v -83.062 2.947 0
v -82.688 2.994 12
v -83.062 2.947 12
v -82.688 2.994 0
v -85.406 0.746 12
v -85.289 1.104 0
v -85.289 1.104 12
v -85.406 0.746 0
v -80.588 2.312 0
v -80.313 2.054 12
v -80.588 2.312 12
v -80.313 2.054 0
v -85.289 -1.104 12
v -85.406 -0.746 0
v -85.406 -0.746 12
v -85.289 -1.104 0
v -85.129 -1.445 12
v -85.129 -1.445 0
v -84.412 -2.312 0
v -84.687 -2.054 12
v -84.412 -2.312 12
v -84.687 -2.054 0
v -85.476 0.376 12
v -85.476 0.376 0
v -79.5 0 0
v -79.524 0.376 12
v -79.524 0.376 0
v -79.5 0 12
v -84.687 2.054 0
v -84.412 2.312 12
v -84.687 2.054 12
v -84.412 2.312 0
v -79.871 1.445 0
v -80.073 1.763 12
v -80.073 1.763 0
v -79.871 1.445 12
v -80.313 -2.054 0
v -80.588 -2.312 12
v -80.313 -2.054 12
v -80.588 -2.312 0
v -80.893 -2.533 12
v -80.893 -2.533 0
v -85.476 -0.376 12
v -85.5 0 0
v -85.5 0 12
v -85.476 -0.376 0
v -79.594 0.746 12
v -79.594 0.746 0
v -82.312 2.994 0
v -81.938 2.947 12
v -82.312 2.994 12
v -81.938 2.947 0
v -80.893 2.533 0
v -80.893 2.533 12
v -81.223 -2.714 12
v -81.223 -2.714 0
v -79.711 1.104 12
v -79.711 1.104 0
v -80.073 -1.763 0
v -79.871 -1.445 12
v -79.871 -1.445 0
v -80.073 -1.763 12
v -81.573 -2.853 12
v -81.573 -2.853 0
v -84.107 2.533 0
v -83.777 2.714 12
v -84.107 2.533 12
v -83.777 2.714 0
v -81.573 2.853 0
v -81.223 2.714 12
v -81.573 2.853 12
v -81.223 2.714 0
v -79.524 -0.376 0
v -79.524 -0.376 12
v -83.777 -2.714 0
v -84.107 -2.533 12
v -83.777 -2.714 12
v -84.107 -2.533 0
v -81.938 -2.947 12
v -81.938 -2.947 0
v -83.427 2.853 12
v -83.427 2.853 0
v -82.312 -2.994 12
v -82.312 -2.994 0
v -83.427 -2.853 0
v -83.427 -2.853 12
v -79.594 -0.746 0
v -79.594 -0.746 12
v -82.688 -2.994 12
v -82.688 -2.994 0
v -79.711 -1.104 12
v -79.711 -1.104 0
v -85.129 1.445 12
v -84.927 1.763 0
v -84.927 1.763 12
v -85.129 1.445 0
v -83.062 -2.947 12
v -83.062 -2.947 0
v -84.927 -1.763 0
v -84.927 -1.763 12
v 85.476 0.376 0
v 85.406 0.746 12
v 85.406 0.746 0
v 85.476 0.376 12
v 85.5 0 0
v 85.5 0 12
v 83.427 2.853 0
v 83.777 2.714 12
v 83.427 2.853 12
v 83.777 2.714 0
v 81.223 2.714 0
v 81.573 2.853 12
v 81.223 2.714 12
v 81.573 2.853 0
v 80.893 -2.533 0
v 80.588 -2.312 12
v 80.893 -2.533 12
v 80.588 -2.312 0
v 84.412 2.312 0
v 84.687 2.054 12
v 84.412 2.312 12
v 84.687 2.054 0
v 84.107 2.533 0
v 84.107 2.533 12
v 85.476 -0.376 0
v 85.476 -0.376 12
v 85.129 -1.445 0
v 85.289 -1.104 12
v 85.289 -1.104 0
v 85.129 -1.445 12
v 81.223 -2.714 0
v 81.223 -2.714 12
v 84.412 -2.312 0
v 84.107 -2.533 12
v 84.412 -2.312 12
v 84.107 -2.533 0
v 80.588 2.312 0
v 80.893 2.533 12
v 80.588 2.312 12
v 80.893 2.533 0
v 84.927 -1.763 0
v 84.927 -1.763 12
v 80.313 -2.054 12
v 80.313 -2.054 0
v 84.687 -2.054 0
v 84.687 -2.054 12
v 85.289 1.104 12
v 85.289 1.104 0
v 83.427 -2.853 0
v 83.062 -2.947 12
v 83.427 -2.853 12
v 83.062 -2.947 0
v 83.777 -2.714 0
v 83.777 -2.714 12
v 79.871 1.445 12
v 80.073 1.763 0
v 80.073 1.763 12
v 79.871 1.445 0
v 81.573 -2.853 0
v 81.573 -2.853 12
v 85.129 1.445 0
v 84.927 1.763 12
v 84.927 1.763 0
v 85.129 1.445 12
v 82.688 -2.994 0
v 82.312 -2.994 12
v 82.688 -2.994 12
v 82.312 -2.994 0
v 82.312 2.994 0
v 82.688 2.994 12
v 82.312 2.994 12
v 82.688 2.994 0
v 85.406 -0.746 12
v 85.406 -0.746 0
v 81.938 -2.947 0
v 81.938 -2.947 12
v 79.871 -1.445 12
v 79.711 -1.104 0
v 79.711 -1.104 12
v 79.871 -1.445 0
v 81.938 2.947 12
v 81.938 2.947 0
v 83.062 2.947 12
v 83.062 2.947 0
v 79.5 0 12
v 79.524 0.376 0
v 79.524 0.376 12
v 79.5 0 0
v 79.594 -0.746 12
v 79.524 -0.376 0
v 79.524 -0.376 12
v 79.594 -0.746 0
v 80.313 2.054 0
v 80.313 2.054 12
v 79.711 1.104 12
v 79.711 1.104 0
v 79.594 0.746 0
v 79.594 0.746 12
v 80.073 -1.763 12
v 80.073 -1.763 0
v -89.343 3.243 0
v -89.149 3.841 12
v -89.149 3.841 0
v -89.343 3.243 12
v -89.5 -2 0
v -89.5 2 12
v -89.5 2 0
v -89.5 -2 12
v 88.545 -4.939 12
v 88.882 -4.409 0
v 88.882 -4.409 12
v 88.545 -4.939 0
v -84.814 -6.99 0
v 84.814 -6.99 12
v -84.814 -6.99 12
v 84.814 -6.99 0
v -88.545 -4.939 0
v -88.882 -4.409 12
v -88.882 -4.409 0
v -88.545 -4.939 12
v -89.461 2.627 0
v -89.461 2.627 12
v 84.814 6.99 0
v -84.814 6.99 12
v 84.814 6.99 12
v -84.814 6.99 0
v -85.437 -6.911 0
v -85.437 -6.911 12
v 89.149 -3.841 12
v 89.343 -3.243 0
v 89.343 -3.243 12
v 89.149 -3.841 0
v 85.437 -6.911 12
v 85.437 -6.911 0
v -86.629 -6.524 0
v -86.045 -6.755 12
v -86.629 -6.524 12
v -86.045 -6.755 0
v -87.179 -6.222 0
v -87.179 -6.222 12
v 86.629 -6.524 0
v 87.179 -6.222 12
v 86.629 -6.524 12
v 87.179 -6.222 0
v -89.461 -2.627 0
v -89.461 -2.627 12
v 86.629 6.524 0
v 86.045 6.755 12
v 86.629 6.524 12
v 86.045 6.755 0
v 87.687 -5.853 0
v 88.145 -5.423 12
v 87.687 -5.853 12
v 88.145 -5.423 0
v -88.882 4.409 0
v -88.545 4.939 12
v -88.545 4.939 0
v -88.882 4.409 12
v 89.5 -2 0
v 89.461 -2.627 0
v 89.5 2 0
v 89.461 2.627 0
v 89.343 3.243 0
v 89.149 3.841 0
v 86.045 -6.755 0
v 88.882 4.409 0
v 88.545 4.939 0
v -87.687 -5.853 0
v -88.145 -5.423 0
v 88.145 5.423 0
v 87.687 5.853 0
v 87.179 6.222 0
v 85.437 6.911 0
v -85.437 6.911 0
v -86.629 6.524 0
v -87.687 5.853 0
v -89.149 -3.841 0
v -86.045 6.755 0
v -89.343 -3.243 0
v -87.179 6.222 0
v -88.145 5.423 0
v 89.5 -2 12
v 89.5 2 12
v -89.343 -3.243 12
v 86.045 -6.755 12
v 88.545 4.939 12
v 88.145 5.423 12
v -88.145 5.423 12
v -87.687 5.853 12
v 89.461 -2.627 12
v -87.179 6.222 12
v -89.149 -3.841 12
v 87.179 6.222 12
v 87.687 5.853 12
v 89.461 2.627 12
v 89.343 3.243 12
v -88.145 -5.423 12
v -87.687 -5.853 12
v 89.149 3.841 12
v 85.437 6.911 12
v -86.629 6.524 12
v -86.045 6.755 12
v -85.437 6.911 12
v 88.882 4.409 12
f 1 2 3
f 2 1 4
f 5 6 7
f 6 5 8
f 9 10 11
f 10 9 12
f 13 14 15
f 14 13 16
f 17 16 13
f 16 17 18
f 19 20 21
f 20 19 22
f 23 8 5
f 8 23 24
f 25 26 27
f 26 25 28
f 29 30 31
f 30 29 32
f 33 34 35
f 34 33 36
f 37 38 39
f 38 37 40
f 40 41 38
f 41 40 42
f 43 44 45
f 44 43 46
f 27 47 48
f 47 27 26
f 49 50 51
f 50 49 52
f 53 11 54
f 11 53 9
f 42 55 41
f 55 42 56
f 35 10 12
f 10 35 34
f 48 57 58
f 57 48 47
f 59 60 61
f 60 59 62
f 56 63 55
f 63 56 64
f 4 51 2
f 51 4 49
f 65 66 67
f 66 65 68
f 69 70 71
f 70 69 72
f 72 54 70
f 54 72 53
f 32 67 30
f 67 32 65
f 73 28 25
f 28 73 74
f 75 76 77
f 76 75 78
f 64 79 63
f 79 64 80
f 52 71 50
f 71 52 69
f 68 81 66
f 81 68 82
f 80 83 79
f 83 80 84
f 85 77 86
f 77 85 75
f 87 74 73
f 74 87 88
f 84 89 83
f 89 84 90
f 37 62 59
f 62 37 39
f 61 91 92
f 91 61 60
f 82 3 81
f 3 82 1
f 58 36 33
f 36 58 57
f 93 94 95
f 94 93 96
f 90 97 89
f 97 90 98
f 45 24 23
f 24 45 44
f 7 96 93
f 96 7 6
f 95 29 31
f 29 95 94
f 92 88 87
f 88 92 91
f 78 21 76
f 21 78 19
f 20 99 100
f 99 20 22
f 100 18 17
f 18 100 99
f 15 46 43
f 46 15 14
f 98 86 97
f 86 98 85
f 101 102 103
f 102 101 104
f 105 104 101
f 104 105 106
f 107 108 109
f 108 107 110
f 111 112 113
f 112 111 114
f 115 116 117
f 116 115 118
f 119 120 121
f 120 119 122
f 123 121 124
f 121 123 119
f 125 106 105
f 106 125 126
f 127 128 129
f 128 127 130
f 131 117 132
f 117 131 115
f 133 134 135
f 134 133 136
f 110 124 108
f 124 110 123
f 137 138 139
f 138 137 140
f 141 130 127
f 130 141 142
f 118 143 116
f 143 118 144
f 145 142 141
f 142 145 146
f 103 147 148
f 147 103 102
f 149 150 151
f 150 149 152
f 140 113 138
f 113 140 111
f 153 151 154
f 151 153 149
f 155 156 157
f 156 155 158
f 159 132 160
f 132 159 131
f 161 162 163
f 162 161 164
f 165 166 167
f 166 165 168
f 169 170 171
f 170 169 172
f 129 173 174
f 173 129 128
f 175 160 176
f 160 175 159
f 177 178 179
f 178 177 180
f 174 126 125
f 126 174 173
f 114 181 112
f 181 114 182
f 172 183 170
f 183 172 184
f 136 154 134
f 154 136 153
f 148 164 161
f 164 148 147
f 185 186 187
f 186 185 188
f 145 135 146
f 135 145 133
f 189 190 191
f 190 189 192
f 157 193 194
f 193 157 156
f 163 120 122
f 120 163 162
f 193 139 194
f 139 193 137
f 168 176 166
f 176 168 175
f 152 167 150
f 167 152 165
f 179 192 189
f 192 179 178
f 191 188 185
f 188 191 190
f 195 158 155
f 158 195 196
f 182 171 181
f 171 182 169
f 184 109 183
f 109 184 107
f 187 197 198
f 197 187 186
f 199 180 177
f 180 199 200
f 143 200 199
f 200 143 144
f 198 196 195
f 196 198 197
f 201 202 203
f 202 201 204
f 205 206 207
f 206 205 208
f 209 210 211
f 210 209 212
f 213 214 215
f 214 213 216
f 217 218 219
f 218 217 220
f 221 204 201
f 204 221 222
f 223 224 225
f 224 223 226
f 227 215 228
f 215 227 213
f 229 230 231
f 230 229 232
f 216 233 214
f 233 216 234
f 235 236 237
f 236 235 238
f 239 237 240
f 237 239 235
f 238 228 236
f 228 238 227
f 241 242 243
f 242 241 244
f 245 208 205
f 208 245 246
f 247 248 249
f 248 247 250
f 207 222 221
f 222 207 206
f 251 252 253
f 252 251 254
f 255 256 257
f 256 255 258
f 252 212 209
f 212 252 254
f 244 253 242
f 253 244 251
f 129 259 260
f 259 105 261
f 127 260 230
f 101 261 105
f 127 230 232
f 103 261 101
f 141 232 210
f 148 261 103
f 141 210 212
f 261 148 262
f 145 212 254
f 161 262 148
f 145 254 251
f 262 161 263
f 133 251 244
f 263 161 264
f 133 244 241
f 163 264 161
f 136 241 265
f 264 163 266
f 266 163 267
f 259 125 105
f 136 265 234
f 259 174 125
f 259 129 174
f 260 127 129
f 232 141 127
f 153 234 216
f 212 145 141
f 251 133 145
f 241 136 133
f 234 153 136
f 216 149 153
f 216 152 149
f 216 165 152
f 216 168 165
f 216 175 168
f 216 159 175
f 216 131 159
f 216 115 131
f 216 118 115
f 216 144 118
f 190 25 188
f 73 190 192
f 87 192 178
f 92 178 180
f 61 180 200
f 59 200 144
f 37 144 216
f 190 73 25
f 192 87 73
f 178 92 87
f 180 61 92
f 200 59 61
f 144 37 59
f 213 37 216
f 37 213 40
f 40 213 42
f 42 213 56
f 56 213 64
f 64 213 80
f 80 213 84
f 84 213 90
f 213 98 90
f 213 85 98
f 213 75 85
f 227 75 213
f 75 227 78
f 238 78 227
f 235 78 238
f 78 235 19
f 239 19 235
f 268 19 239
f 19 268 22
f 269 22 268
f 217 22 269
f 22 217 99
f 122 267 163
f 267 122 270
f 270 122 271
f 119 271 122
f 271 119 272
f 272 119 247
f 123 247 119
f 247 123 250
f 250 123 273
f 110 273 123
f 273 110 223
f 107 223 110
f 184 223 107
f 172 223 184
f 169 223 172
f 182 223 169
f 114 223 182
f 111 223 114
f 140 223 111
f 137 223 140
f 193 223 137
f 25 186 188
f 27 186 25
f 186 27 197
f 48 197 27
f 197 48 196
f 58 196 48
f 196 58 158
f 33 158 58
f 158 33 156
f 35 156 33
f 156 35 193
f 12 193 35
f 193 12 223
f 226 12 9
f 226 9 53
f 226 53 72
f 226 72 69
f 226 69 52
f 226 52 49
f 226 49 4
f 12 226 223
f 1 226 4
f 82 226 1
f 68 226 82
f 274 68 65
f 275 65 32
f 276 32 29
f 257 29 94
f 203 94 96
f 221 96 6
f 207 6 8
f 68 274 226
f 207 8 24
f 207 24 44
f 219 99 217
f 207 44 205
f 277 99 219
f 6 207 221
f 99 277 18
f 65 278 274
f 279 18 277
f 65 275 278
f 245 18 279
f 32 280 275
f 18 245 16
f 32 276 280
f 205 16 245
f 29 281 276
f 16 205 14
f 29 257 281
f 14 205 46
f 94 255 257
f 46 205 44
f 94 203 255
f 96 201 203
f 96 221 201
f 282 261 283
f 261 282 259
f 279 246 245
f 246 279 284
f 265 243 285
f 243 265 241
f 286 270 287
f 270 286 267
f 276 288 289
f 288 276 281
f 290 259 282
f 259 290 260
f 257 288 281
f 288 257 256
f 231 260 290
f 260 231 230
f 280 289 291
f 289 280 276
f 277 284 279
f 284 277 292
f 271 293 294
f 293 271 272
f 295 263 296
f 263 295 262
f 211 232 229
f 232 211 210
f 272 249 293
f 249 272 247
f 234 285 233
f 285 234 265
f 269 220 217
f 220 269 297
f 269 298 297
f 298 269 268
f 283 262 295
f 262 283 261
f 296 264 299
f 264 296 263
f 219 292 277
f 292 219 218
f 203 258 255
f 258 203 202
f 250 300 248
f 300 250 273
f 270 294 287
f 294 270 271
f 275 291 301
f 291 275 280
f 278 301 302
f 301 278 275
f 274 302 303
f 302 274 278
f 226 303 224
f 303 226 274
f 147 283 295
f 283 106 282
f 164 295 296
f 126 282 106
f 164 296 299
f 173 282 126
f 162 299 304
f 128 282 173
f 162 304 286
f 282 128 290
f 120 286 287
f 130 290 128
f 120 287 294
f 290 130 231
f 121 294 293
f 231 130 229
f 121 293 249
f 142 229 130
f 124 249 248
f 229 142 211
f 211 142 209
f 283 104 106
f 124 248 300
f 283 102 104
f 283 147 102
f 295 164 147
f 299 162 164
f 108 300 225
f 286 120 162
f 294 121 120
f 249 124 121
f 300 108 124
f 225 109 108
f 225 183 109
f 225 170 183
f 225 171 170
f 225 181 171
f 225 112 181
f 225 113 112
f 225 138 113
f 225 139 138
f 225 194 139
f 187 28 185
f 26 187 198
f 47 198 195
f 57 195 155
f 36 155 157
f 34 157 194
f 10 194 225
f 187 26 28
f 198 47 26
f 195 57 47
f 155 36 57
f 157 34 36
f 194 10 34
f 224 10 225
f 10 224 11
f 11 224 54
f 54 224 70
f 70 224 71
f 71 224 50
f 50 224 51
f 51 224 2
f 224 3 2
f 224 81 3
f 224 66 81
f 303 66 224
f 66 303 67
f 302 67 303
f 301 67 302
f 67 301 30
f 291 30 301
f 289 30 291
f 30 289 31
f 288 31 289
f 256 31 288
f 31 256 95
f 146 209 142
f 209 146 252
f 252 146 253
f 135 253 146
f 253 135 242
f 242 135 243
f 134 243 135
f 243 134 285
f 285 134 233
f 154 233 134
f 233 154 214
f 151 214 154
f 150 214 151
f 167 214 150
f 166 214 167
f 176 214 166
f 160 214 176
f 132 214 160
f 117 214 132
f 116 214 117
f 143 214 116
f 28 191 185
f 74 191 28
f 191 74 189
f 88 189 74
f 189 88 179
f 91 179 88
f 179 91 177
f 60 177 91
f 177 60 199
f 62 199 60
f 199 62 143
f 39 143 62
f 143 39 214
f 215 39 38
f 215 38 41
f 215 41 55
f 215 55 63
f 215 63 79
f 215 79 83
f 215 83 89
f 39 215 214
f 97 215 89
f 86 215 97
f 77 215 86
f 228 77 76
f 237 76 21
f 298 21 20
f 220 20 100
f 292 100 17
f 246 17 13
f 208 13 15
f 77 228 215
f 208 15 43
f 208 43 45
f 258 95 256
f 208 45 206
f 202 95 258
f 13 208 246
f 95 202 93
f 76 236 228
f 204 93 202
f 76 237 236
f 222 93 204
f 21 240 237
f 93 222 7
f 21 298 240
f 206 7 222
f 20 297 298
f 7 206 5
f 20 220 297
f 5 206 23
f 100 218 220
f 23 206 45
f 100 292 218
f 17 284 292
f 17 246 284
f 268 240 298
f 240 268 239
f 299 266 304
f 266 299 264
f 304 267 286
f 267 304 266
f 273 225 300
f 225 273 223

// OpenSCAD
$fn = 50;


difference() {
	union() {
		hull() {
			translate(v = [-84.5000000000, 2.0000000000, 0]) {
				cylinder(h = 12, r = 5);
			}
			translate(v = [84.5000000000, 2.0000000000, 0]) {
				cylinder(h = 12, r = 5);
			}
			translate(v = [-84.5000000000, -2.0000000000, 0]) {
				cylinder(h = 12, r = 5);
			}
			translate(v = [84.5000000000, -2.0000000000, 0]) {
				cylinder(h = 12, r = 5);
			}
		}
	}
	union() {
		translate(v = [-82.5000000000, 0.0000000000, -100.0000000000]) {
			cylinder(h = 200, r = 3.0000000000);
		}
		translate(v = [-82.5000000000, 0.0000000000, -100.0000000000]) {
			cylinder(h = 200, r = 3.0000000000);
		}
		translate(v = [82.5000000000, 0.0000000000, -100.0000000000]) {
			cylinder(h = 200, r = 3.0000000000);
		}
		translate(v = [82.5000000000, 0.0000000000, -100.0000000000]) {
			cylinder(h = 200, r = 3.0000000000);
		}
	}
}
